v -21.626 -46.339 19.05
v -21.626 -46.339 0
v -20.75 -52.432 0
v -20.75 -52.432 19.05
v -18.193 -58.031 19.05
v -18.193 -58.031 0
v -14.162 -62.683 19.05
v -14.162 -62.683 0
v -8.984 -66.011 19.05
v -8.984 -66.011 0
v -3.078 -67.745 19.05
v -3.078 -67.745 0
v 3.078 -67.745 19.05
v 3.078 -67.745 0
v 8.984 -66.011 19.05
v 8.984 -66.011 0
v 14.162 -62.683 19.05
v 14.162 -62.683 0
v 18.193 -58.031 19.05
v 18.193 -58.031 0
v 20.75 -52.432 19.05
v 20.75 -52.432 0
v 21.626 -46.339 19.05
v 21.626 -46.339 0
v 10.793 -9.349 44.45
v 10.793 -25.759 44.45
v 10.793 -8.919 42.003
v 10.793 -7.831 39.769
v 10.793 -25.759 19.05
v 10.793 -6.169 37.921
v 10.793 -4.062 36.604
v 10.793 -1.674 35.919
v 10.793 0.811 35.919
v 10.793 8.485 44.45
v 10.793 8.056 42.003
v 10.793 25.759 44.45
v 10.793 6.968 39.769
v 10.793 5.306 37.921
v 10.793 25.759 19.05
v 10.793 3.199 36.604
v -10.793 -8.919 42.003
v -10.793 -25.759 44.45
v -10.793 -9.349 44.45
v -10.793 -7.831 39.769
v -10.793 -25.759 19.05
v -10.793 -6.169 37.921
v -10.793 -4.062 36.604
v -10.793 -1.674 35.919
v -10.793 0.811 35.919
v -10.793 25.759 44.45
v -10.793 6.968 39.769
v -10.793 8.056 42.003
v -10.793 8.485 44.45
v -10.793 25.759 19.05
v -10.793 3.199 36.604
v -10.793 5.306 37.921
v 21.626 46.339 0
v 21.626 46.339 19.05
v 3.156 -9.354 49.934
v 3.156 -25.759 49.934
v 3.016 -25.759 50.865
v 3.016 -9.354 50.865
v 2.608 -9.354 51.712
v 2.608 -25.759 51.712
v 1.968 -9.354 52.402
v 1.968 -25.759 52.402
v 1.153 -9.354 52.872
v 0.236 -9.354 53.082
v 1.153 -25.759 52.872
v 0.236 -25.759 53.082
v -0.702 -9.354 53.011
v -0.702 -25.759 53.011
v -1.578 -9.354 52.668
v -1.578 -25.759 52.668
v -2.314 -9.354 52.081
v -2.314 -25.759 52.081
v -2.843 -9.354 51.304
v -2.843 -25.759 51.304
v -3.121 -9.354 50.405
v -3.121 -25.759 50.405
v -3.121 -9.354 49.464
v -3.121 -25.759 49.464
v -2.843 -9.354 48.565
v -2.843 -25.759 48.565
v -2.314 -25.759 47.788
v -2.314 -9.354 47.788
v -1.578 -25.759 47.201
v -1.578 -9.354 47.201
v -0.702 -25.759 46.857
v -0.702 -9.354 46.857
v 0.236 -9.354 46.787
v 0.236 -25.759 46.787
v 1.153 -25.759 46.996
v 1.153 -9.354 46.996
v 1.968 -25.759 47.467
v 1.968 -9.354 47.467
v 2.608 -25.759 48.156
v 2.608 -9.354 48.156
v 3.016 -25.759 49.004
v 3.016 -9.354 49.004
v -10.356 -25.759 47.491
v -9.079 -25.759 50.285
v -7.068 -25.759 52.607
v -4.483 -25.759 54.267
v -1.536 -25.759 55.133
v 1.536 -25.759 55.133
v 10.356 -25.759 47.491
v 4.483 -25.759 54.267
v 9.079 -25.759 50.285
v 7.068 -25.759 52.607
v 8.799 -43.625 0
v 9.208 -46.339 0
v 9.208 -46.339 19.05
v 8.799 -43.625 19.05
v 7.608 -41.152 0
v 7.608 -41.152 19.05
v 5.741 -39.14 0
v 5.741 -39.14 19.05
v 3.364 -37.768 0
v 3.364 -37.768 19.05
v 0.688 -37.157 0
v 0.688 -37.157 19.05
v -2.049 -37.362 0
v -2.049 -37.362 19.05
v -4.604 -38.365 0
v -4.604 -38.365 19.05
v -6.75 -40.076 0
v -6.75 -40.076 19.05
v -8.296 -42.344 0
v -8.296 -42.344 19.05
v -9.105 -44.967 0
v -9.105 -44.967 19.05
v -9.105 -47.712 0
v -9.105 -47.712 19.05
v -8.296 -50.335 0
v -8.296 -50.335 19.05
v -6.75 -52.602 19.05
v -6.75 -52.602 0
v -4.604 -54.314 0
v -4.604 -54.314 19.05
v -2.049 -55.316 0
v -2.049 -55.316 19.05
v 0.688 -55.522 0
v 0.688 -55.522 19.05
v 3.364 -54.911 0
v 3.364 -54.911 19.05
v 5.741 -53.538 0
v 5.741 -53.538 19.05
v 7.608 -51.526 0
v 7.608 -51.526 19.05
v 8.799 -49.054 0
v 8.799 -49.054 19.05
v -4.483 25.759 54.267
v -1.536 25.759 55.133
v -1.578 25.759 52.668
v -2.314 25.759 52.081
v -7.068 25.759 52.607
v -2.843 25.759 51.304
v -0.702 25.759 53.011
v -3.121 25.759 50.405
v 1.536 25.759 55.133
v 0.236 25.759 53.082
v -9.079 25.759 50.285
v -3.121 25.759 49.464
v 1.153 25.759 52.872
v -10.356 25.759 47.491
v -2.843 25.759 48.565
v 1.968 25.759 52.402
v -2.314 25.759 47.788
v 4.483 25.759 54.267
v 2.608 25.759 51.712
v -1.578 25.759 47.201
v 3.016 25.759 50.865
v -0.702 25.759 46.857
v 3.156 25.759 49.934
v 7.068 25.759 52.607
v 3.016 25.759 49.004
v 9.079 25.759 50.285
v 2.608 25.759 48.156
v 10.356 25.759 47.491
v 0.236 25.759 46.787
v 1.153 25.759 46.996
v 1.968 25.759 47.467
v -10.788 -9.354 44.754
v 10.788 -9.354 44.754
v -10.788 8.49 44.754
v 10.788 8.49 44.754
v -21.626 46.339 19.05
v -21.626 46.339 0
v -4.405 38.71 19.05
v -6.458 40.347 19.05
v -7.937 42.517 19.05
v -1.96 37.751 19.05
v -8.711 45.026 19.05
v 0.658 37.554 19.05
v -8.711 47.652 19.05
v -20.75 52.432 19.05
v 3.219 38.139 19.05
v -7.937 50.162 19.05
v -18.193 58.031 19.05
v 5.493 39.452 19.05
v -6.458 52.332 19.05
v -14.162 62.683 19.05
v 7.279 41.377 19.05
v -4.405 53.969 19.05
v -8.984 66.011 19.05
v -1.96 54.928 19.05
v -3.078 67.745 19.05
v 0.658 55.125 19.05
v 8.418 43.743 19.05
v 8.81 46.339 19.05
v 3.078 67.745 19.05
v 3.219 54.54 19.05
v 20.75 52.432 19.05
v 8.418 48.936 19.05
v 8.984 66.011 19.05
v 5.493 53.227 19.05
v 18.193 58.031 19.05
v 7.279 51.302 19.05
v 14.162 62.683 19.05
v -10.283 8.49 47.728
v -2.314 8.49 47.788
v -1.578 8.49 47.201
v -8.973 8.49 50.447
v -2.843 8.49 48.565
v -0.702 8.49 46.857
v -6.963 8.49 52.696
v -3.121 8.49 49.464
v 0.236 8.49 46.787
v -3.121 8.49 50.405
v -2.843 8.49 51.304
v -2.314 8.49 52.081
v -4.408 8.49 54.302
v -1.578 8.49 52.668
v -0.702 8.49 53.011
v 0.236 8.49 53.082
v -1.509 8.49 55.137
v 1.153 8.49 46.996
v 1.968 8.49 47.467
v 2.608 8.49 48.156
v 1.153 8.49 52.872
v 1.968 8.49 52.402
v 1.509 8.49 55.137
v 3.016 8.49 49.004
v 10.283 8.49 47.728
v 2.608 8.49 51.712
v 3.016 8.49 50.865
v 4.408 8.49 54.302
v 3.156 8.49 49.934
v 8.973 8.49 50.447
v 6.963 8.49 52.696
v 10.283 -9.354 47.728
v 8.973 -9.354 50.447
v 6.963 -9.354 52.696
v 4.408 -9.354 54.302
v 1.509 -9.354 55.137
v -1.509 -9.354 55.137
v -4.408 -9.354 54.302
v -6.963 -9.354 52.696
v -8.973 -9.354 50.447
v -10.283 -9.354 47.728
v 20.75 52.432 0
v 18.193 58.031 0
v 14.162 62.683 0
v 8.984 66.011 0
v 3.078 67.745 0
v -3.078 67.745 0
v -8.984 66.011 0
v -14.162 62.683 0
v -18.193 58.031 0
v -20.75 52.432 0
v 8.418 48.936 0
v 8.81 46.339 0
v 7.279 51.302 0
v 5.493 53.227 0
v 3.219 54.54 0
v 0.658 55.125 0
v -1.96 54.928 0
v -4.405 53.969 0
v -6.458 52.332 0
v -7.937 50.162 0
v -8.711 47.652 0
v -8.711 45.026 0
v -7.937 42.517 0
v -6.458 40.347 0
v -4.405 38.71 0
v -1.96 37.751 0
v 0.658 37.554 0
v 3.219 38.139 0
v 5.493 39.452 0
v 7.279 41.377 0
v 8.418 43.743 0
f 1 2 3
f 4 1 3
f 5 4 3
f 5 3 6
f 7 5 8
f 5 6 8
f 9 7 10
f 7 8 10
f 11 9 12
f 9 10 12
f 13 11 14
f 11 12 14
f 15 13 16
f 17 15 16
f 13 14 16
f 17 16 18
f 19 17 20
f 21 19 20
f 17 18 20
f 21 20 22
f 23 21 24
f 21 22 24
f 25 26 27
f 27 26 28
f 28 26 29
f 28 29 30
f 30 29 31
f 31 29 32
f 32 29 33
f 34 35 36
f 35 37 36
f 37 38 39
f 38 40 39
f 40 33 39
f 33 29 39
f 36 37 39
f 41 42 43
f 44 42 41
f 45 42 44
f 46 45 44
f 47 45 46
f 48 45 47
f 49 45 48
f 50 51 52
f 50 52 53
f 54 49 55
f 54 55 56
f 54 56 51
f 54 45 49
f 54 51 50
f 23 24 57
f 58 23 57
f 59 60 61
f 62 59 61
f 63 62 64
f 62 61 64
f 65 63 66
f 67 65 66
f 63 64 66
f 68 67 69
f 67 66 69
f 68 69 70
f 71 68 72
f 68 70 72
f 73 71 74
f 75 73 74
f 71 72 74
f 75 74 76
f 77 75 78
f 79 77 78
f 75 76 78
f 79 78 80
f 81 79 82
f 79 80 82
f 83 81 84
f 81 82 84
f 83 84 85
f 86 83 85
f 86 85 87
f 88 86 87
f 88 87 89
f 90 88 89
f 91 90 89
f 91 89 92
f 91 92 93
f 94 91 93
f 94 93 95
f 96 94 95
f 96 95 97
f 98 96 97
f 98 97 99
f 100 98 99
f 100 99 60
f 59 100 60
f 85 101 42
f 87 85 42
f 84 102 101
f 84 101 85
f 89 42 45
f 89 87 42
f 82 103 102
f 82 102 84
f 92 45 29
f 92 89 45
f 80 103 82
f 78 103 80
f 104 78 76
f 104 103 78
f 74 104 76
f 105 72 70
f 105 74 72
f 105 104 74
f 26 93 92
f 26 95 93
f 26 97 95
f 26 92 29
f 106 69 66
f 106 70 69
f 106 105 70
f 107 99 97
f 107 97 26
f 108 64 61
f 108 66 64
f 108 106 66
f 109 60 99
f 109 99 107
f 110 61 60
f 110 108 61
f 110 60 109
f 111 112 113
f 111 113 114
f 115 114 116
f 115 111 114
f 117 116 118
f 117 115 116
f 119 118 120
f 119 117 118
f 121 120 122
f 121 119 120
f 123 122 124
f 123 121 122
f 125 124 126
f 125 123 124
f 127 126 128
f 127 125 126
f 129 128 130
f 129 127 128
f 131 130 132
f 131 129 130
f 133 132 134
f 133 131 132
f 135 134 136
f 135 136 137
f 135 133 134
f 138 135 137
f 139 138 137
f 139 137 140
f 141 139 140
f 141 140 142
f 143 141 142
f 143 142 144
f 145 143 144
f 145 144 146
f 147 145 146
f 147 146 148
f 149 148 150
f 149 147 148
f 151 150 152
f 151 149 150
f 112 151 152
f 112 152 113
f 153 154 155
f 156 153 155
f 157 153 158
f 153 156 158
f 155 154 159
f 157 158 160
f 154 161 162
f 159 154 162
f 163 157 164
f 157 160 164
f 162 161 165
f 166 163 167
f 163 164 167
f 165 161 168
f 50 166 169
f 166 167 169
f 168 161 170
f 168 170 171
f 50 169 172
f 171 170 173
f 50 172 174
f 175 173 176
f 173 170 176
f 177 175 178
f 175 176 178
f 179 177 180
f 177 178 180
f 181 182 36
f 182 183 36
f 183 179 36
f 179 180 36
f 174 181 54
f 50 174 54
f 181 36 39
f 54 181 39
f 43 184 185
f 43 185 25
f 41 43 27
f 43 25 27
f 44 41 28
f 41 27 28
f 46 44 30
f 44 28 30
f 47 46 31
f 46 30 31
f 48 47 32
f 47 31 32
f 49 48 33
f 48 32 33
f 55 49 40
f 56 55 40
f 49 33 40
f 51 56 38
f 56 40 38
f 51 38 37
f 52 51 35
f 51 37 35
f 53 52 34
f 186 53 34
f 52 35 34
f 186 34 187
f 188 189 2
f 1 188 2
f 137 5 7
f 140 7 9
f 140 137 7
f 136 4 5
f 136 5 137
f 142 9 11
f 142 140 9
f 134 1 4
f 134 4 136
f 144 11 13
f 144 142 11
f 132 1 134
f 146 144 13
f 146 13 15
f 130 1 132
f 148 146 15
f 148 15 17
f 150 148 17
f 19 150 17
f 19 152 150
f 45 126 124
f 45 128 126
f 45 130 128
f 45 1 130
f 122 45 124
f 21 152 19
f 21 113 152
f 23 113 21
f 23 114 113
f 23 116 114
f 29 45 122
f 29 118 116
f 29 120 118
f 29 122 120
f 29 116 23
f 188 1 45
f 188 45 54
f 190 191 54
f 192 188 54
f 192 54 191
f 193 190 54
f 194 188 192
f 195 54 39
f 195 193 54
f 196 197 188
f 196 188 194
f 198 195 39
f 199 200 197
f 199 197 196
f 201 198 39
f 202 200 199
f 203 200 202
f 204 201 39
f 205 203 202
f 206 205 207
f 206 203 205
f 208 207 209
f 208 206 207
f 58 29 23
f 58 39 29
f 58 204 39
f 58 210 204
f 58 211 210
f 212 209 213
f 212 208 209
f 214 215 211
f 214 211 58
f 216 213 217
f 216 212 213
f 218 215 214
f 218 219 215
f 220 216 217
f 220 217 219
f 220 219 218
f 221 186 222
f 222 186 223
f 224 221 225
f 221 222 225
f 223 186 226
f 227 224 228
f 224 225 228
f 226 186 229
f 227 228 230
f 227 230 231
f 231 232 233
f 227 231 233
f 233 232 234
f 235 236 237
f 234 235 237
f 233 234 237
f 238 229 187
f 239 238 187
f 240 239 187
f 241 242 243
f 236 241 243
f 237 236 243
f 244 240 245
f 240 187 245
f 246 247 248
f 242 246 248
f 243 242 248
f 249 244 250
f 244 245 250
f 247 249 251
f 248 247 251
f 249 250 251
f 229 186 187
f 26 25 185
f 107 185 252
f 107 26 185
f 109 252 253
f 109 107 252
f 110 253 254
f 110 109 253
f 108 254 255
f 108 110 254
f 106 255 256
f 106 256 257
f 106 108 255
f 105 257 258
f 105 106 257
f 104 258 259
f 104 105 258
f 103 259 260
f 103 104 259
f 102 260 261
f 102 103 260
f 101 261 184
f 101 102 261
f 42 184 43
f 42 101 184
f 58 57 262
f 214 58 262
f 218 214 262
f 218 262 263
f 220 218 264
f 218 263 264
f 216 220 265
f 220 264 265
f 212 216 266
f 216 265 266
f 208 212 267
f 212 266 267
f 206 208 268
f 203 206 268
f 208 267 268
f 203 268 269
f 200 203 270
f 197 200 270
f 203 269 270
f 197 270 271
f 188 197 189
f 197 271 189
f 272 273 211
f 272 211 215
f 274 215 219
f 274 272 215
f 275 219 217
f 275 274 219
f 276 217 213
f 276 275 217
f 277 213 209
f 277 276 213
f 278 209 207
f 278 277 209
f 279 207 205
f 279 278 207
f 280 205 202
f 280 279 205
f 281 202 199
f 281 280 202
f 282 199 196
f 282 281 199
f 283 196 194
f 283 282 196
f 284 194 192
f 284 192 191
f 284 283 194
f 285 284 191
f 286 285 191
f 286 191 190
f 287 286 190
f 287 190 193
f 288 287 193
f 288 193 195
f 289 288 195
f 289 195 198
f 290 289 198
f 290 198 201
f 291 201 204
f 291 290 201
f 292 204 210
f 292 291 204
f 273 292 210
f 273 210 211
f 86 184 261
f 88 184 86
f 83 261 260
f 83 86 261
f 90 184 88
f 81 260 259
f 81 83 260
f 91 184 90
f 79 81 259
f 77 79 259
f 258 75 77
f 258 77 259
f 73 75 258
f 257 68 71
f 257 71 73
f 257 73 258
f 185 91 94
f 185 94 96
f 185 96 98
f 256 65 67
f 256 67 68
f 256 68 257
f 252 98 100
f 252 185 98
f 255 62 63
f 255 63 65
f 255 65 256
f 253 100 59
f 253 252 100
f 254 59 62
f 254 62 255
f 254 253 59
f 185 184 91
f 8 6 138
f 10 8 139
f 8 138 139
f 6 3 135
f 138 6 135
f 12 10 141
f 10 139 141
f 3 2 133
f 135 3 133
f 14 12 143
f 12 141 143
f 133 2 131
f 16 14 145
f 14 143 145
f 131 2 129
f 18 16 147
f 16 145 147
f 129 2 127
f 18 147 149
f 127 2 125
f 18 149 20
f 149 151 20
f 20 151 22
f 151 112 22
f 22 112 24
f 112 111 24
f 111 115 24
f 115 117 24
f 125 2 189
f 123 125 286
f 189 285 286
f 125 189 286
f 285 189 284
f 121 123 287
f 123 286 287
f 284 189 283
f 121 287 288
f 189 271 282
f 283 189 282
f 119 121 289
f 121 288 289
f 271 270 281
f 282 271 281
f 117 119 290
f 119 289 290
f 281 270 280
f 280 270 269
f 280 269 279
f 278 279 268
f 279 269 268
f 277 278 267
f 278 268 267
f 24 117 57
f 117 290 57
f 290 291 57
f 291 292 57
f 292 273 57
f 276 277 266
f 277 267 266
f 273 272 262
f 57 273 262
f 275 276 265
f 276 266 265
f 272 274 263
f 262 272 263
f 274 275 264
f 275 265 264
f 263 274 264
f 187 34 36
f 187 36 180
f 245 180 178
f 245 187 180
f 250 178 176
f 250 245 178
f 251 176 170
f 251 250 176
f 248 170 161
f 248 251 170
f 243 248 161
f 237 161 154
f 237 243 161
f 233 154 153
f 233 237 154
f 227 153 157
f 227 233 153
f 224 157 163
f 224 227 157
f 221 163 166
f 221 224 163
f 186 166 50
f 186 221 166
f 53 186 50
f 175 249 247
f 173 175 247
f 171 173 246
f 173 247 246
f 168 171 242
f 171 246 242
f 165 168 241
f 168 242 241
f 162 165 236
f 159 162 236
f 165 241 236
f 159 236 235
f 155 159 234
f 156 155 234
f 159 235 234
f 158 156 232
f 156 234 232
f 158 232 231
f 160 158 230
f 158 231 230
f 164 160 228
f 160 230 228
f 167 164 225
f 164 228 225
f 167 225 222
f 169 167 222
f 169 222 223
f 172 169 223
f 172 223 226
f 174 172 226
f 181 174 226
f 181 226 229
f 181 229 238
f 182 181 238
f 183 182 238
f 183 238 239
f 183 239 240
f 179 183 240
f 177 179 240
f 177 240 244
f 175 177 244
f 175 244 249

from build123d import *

# Parameters (mm, degrees)
F0_R      = 9.207917
F0_R_2    = 8.8097795002
F1_DEPTH  = 19.05
F2_W      = 21.5854309499
F2_H      = 51.5172295272
F3_DEPTH  = 25.4
F5_DEPTH  = 53.34
F7_DEPTH  = 25.4
F8_DEPTH  = 25.4
F9_W      = 17.8439589217
F9_H      = 25.0391028821
F10_DEPTH = 25.4
F11_DEPTH = 25.4
F12_R     = 3.1560406616
F13_DEPTH = 76.2


with BuildPart() as f1:
    # F0 (on Top) → F1 (new body)
    with BuildSketch(Plane.XY):
        with BuildLine():
            ThreePointArc((21.6257235091, 46.3394257879), (0, 67.965149297), (-21.6257235091, 46.3394257879))
            Line((-21.6257235091, 46.3394257879), (-21.6257235091, -46.3394257879))
            ThreePointArc((-21.6257235091, -46.3394257879), (0, -67.965149297), (21.6257235091, -46.3394257879))
            Line((21.6257235091, -46.3394257879), (21.6257235091, 46.3394257879))
        make_face()
        with Locations((0, -46.3394257879)):
            Circle(F0_R, mode=Mode.SUBTRACT)
        with Locations((0, 46.3394257879)):
            Circle(F0_R_2, mode=Mode.SUBTRACT)
    extrude(amount=F1_DEPTH)

    # F2 (on face) → F3 (join)
    with BuildSketch(Plane.XY.offset(19.05)):
        Rectangle(F2_W, F2_H)
    extrude(amount=F3_DEPTH)

    # F4 (on face) → F5 (join)
    with BuildSketch(Plane.XZ.offset(25.7586147636)):
        with BuildLine():
            Line((0, 44.45), (10.792715475, 44.45))
            ThreePointArc((10.792715475, 44.45), (0, 55.242715475), (-10.792715475, 44.45))
            Line((-10.792715475, 44.45), (0, 44.45))
        make_face()
    extrude(amount=-F5_DEPTH)

    # F6 (on Right) → F7 (cut)
    with BuildSketch(Plane.YZ):
        Polygon((25.7586147636, 59.1440834105), (25.7586147636, 44.753793627), (25.7586147636, 35.5440117419), (39.5732931793, 35.5440117419), (39.5732931793, 59.1440834105), align=None)
    extrude(amount=-F7_DEPTH, mode=Mode.SUBTRACT)

    # F6 (on Right) → F8 (cut)
    with BuildSketch(Plane.YZ):
        Polygon((25.7586147636, 59.1440834105), (25.7586147636, 44.753793627), (25.7586147636, 35.5440117419), (39.5732931793, 35.5440117419), (39.5732931793, 59.1440834105), align=None)
    extrude(amount=F8_DEPTH, mode=Mode.SUBTRACT)

    # F9 (on Right) → F10 (cut)
    with BuildSketch(Plane.YZ):
        with Locations((-0.4317085259, 57.2733450681)):
            Rectangle(F9_W, F9_H)
        with BuildLine():
            Line((8.490270935, 44.753793627), (-9.3536879867, 44.753793627))
            ThreePointArc((-9.3536879867, 44.753793627), (-0.4317085259, 35.8318141662), (8.490270935, 44.753793627))
        make_face()
    extrude(amount=-F10_DEPTH, mode=Mode.SUBTRACT)

    # F9 (on Right) → F11 (cut)
    with BuildSketch(Plane.YZ):
        with Locations((-0.4317085259, 57.2733450681)):
            Rectangle(F9_W, F9_H)
        with BuildLine():
            Line((8.490270935, 44.753793627), (-9.3536879867, 44.753793627))
            ThreePointArc((-9.3536879867, 44.753793627), (-0.4317085259, 35.8318141662), (8.490270935, 44.753793627))
        make_face()
    extrude(amount=F11_DEPTH, mode=Mode.SUBTRACT)

    # F12 (on face) → F13 (cut)
    with BuildSketch(Plane.XZ.offset(25.7586147636)):
        with Locations((0, 49.9343015254)):
            Circle(F12_R)
    extrude(amount=-F13_DEPTH, mode=Mode.SUBTRACT)


solid = f1.part
